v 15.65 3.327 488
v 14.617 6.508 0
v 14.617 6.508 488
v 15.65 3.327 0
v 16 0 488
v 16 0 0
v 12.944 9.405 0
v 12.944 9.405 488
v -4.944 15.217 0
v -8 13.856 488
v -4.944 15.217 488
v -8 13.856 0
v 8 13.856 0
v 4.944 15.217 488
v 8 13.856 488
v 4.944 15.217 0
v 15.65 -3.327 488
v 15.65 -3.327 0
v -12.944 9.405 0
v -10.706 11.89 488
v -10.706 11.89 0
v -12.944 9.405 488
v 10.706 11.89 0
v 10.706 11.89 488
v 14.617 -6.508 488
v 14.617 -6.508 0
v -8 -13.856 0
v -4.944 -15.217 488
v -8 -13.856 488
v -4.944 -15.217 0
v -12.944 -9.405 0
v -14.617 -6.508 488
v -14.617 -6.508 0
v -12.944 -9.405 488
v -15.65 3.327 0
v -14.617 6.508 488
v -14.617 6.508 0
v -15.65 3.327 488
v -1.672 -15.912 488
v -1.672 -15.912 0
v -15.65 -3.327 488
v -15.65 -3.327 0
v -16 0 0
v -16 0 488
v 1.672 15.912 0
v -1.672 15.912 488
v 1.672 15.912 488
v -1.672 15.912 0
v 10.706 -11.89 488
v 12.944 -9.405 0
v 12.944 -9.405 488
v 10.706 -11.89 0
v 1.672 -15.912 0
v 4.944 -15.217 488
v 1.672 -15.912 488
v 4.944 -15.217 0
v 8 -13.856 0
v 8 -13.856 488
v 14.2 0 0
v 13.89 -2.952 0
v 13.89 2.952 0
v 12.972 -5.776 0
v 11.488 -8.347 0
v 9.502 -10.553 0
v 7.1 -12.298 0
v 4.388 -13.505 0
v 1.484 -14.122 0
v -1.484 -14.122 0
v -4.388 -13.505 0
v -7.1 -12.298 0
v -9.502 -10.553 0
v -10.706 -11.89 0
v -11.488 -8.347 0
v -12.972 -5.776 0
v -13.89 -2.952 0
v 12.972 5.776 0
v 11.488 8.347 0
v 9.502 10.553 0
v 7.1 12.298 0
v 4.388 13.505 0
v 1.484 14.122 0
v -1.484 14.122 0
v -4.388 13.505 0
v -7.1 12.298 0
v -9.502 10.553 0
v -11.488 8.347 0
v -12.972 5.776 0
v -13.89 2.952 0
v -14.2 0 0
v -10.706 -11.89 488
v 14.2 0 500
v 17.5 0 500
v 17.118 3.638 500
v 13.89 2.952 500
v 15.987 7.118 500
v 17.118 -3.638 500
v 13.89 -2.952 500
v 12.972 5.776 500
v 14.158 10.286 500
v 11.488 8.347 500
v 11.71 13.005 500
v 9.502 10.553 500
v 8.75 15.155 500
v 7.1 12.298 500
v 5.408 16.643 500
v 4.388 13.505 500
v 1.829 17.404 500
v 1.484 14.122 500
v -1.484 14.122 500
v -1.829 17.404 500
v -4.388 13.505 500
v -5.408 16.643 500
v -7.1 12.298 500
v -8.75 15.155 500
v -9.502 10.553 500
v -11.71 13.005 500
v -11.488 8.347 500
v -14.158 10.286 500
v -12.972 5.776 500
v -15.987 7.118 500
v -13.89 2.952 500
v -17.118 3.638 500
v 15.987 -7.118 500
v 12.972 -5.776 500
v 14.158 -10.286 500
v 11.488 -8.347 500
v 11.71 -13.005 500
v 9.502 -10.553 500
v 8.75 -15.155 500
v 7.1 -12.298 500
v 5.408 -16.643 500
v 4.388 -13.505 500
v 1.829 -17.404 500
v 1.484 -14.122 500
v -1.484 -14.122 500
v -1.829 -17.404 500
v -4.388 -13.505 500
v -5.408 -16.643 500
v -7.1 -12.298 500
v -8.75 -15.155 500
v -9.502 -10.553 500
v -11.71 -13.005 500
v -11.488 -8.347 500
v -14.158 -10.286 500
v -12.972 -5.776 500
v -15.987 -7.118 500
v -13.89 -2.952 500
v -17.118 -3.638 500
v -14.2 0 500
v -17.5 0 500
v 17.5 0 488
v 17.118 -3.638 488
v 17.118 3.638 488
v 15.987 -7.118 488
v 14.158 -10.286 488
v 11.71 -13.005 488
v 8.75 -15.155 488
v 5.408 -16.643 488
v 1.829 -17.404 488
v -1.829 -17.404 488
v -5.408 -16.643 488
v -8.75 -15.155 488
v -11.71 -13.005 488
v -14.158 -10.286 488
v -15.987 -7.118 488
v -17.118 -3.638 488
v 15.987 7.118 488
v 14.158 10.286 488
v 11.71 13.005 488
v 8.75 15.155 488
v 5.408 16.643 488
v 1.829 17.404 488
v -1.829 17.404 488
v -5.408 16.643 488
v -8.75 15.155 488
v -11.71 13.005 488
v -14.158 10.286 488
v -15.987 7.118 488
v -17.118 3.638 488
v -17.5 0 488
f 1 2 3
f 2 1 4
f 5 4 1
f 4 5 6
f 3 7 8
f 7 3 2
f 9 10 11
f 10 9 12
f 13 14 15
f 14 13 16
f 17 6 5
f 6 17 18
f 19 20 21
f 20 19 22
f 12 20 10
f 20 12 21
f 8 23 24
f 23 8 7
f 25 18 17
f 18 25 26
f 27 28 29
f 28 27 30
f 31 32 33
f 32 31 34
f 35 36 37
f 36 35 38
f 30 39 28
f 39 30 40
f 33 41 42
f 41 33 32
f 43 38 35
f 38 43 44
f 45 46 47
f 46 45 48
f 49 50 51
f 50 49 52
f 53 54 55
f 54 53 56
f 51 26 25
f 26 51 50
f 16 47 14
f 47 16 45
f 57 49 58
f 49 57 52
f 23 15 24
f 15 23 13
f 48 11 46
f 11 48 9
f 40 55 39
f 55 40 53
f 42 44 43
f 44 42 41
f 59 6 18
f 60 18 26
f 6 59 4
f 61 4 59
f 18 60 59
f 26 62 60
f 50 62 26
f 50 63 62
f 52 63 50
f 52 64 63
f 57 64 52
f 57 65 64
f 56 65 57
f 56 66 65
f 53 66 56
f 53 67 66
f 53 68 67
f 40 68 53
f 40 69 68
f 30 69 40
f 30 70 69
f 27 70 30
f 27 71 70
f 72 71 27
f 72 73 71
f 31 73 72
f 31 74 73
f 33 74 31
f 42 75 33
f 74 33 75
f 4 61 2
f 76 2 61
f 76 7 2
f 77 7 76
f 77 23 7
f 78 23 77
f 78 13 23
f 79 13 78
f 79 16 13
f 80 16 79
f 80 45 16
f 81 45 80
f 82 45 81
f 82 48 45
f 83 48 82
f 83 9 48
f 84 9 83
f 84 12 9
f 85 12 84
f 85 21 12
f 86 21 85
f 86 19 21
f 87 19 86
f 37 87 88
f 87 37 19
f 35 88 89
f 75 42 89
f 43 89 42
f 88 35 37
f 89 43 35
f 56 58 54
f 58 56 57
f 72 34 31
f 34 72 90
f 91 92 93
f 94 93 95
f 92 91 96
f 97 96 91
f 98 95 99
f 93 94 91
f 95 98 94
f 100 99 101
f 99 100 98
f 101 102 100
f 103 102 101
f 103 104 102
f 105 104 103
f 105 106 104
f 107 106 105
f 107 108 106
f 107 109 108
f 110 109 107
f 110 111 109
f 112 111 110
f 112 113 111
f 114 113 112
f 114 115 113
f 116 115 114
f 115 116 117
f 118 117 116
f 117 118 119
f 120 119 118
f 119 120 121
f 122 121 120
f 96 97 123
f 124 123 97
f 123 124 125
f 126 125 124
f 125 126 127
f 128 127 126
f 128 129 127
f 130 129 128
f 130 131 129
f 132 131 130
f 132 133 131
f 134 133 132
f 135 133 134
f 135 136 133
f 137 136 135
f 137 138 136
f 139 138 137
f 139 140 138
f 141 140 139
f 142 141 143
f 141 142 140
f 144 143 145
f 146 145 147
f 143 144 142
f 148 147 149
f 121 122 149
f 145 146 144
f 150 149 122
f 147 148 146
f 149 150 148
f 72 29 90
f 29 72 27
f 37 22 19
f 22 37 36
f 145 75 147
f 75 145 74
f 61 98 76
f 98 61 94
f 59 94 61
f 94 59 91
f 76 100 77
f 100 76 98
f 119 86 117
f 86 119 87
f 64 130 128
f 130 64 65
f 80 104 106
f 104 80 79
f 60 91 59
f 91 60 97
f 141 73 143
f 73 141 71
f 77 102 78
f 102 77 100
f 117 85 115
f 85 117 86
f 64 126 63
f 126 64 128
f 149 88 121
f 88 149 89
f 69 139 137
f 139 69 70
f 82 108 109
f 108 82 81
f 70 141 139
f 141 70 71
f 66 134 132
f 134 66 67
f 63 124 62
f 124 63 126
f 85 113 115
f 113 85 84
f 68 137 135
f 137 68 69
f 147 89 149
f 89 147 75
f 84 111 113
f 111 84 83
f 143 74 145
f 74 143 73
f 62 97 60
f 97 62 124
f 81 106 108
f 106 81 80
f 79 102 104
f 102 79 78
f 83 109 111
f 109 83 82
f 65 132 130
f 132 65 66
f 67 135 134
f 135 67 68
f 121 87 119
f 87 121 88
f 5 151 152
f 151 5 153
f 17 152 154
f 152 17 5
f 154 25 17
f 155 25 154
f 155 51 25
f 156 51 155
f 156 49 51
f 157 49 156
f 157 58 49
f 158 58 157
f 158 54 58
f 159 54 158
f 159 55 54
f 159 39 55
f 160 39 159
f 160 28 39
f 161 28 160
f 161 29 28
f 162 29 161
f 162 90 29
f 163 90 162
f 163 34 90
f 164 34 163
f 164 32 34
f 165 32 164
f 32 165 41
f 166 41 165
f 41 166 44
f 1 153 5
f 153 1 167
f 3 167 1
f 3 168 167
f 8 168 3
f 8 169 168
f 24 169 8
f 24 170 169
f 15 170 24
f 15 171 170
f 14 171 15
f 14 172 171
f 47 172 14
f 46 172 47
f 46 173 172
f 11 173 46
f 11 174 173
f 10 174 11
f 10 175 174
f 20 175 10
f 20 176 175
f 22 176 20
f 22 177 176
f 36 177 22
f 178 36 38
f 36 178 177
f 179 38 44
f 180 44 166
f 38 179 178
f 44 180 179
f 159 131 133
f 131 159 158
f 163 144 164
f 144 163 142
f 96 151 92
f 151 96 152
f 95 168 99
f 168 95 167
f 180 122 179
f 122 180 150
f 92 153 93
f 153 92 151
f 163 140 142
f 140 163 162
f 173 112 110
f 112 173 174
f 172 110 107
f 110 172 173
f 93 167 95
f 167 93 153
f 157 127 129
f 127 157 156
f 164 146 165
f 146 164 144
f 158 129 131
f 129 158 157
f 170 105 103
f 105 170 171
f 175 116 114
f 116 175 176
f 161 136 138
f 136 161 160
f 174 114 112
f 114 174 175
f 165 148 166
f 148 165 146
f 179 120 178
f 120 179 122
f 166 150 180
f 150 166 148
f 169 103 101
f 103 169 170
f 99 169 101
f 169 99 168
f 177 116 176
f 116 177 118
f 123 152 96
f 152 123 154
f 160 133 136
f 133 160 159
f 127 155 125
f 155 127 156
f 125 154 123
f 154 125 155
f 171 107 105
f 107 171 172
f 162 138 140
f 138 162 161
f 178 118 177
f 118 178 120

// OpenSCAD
// Parameters
nominal_size_mm = 32; //[16:64:1]
length_mm = 500; //[250:1000:1]
ht32_outer_diameter = 32; //[24:48:0.5]
ht32_wall_thickness = 1.8; //[1.0:3.6:0.1]
interface_ring_length = 12; //[6:24:1]
interface_ring_radial_thickness = 1.5; //[0.5:4:0.1]
overlap_mm = 1; //[0.5:2:0.1]

// HT Pipe - complete geometry
module ht_pipe() {
  color([0.85, 0.85, 0.8]) {
    // Outer pipe
    difference() {
      cylinder(h=length_mm, r=ht32_outer_diameter/2, center=false);
      // Inner void
      translate([0, 0, 0])
        cylinder(h=length_mm, r=ht32_outer_diameter/2 - ht32_wall_thickness, center=false);
    }
    
    // End fitting interface
    translate([0, 0, length_mm - interface_ring_length]) {
      difference() {
        cylinder(h=interface_ring_length, r=ht32_outer_diameter/2 + interface_ring_radial_thickness, center=false);
        // Inner void for interface
        translate([0, 0, 0])
          cylinder(h=interface_ring_length + overlap_mm, r=ht32_outer_diameter/2 - ht32_wall_thickness, center=false);
      }
    }
  }
}

// Assembly
module assembly() {
  ht_pipe();
}

assembly();
